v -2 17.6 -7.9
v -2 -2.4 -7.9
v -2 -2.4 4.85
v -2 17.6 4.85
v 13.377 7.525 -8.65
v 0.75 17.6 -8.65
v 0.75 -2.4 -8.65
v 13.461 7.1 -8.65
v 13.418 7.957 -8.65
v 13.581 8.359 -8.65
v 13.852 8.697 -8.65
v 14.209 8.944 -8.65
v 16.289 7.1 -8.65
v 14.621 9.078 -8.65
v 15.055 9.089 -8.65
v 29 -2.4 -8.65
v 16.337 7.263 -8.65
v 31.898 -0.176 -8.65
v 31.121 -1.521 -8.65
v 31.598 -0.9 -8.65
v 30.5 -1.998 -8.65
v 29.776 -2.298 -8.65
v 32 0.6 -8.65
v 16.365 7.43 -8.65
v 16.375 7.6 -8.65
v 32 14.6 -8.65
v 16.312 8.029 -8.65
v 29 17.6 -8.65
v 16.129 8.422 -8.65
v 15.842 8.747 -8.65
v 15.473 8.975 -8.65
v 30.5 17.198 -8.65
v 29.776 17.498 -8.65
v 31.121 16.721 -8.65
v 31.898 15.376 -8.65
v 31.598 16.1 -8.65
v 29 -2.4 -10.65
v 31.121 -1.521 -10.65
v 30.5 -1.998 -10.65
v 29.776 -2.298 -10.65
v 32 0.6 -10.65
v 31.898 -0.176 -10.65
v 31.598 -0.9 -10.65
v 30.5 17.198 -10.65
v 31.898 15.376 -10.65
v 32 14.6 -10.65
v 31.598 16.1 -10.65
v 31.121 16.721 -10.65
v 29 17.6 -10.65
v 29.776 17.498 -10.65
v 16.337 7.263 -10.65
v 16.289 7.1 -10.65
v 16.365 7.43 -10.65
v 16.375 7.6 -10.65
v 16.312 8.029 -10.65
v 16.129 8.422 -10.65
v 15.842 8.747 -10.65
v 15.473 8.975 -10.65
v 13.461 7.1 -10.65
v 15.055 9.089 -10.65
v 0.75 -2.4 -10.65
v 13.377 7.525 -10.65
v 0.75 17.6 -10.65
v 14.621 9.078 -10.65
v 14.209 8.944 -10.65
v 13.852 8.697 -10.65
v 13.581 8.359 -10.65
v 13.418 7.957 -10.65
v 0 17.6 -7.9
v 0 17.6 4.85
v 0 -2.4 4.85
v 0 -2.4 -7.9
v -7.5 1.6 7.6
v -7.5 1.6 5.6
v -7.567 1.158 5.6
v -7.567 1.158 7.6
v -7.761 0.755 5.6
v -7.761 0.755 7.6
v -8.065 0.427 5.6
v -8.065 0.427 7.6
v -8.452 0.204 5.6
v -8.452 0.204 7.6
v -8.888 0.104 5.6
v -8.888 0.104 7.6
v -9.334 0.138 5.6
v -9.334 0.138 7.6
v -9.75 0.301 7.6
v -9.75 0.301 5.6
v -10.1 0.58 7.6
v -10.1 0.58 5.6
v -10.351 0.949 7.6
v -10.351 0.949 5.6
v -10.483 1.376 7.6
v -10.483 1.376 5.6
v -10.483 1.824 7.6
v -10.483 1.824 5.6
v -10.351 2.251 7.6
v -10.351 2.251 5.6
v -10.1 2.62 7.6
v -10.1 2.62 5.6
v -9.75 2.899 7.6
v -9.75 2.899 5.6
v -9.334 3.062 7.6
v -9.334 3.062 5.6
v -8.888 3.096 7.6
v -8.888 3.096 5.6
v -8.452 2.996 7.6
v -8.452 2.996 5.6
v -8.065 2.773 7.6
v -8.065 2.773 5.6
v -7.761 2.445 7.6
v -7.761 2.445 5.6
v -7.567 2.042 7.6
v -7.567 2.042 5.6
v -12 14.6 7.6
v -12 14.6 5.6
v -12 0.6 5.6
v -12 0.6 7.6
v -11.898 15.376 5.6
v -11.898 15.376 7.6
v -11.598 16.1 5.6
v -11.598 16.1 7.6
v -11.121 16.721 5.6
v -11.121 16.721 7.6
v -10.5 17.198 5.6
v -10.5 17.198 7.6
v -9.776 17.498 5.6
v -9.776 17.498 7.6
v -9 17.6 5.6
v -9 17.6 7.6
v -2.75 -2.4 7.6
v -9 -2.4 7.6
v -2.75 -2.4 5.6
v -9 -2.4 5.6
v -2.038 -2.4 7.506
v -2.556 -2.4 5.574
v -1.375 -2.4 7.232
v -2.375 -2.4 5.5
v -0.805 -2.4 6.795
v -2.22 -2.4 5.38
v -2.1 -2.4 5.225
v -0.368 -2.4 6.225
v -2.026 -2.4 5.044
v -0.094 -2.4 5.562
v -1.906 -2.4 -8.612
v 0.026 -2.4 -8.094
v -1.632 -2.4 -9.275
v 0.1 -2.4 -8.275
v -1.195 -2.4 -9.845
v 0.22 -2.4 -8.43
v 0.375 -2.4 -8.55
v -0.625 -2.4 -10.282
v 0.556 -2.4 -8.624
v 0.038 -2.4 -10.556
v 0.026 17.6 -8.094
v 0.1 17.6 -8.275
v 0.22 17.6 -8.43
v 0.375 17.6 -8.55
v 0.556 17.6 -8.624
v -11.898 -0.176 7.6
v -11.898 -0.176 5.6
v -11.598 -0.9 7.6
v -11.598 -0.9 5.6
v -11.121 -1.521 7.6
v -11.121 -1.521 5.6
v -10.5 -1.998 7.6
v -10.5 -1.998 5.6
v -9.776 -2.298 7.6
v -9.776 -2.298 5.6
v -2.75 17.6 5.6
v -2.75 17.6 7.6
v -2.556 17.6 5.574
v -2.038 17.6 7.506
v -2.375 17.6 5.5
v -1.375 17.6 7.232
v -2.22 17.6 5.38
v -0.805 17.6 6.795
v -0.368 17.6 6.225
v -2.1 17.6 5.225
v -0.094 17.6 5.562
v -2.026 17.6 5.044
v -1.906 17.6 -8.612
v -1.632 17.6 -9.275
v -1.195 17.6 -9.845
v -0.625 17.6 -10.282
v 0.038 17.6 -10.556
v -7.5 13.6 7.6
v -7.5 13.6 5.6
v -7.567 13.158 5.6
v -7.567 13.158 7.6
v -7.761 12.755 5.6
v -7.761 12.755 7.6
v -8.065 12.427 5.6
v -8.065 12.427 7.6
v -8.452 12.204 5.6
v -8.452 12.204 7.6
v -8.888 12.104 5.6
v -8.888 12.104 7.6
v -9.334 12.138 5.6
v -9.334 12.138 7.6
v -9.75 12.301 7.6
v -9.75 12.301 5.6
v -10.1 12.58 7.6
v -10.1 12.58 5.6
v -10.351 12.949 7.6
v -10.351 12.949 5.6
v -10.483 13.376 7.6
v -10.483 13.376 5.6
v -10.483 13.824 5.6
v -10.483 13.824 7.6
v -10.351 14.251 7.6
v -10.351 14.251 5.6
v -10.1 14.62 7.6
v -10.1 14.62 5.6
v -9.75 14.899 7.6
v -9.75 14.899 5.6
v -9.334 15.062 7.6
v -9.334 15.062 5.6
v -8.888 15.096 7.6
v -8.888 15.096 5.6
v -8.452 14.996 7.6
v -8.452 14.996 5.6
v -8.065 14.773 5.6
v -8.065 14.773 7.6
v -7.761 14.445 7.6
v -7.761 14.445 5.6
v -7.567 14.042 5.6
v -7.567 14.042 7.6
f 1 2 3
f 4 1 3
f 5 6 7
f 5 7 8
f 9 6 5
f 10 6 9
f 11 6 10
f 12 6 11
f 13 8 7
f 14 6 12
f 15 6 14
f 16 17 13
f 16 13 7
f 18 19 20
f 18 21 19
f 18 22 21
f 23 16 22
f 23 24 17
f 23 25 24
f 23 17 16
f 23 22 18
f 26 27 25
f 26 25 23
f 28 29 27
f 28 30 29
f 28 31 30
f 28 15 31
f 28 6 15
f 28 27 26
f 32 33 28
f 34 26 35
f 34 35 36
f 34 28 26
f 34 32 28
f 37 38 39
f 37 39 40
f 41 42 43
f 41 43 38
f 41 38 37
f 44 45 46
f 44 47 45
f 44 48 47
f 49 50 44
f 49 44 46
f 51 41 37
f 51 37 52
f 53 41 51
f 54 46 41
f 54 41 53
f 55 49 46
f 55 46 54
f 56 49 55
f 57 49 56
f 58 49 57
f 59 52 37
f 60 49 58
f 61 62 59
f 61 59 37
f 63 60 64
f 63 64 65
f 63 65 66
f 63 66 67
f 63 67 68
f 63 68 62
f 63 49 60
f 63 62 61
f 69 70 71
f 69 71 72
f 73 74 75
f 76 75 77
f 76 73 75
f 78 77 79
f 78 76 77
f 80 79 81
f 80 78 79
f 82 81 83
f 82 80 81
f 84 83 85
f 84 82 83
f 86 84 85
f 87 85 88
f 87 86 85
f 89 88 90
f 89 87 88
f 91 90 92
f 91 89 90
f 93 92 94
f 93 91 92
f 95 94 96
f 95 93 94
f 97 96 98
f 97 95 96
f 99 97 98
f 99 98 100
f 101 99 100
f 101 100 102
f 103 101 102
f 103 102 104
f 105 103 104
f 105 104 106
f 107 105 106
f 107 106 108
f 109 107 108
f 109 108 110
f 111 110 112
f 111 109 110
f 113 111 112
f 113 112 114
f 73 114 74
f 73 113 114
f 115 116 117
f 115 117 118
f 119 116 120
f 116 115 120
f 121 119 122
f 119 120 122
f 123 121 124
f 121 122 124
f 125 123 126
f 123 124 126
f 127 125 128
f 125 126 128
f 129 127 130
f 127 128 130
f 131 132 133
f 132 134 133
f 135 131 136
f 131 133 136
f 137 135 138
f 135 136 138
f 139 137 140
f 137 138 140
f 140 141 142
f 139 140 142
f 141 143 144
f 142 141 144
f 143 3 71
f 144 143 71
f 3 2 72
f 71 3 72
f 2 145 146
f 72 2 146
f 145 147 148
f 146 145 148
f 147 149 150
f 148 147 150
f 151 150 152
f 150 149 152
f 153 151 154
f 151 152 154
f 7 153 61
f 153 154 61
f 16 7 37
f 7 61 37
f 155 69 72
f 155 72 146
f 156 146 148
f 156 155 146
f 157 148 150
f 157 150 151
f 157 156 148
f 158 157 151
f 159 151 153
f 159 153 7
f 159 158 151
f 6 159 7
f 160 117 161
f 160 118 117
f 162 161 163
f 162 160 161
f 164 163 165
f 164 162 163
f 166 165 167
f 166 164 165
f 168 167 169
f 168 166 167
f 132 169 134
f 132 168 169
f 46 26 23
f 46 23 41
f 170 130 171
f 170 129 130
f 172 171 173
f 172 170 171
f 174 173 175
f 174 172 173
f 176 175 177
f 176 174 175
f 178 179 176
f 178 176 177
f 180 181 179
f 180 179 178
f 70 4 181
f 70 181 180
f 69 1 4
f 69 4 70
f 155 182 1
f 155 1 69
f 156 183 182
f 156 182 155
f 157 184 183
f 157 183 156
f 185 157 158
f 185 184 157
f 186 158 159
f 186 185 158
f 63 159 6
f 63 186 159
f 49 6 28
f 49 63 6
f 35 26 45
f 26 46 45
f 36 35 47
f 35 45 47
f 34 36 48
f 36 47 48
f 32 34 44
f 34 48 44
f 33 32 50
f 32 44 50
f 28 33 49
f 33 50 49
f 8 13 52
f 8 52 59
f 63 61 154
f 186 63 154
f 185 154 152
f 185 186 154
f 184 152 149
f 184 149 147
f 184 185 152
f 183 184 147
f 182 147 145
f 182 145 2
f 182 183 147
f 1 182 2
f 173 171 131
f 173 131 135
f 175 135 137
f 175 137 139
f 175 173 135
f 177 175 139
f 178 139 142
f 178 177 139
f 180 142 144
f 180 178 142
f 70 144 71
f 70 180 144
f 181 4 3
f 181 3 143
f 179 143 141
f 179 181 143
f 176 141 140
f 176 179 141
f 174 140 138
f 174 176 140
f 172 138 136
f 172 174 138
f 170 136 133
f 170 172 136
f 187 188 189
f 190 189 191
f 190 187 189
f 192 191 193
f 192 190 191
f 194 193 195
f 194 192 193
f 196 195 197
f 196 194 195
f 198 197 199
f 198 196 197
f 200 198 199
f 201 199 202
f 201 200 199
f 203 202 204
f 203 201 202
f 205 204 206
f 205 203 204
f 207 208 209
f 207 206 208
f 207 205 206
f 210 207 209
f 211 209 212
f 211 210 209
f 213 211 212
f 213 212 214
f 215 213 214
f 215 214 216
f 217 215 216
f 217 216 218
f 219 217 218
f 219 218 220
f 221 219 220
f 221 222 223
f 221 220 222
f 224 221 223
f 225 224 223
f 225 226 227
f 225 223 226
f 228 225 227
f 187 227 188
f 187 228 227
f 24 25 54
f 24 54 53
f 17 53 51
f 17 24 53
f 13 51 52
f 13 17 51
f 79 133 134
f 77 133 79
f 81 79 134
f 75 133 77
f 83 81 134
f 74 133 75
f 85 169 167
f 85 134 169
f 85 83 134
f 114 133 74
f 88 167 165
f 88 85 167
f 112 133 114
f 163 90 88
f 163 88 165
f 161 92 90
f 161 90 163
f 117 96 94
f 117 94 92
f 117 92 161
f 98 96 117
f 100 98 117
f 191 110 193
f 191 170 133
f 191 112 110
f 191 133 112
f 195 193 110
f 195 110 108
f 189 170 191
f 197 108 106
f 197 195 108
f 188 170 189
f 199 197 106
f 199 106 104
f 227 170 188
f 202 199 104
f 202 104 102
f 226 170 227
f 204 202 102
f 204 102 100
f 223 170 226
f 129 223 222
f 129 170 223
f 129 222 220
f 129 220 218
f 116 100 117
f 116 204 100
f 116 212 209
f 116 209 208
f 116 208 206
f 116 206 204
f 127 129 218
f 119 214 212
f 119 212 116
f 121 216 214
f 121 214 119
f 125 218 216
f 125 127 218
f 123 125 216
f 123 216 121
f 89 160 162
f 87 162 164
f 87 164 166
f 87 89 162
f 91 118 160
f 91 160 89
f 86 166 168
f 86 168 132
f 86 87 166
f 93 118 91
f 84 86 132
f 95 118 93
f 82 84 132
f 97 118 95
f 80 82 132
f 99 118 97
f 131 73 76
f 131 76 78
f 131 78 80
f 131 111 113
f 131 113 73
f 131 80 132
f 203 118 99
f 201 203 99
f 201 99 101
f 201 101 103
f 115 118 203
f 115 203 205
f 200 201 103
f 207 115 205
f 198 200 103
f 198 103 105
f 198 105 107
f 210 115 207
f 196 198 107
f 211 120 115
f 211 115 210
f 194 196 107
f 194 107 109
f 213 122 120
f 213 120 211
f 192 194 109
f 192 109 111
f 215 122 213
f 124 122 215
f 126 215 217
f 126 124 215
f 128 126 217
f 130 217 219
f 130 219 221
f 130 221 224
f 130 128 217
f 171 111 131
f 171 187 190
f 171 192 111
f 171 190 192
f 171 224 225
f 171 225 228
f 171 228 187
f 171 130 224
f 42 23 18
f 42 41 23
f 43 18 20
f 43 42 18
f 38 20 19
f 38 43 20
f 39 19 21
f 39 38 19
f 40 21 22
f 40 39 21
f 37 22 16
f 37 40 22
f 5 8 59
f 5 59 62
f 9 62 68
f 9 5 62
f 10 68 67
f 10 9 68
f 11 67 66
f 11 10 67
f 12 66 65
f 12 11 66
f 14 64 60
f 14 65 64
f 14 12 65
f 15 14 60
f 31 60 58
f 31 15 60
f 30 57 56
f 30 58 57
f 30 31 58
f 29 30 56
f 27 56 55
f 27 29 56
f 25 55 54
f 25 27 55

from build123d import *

# Parameters (mm, degrees)
BASE_FLANGE1_DEPTH    = 10
FILLET1_R             = 3
SKETCH7_R             = 1.5
CUT_EXTRUDE1_DEPTH    = 39.171488051
BODY_MOVE_COPY1_ANGLE = 90


# Sheet-metal steps are written as plain solids
with BuildPart() as part:
    # Sketch1 → Base-Flange1 (new, symmetric)
    with BuildSketch(Plane.XY):
        with BuildLine():
            Line((-12, 0), (-2.75, 0))
            ThreePointArc((-2.75, 0), (-0.805456352, 0.805456352), (0, 2.75))
            Line((0, 2.75), (0, 15.5))
            ThreePointArc((0, 15.5), (0.219669914, 16.030330086), (0.75, 16.25))
            Line((0.75, 16.25), (32, 16.25))
            Line((32, 16.25), (32, 18.25))
            Line((32, 18.25), (0.75, 18.25))
            ThreePointArc((0.75, 18.25), (-1.194543648, 17.444543648), (-2, 15.5))
            Line((-2, 15.5), (-2, 2.75))
            ThreePointArc((-2, 2.75), (-2.219669914, 2.219669914), (-2.75, 2))
            Line((-2.75, 2), (-12, 2))
            Line((-12, 2), (-12, 0))
        make_face()
    extrude(amount=BASE_FLANGE1_DEPTH, both=True)

    # Fillet1
    fillet1_edges = [part.edges().sort_by_distance(p)[0] for p in [
        (32, 17.25, -10),
        (-12, 1, -10),
        (32, 17.25, 10),
        (-12, 1, 10),
    ]]
    fillet(fillet1_edges, radius=FILLET1_R)

    # Sketch7 → Cut-Extrude1 (cut, through all)
    with BuildSketch(Plane(origin=(0, 0, 0), x_dir=(1, 0, 0), z_dir=(0, 1, 0))):
        with BuildLine():
            Line((16.289213562, 0.5), (13.460786438, 0.5))
            ThreePointArc((13.460786438, 0.5), (14.621347032, -1.478397839), (16.375, 0))
            ThreePointArc((16.375, 0), (16.353397839, 0.253652968), (16.289213562, 0.5))
        make_face()
        with Locations((-9, -6)):
            Circle(SKETCH7_R)
        with Locations((-9, 6)):
            Circle(SKETCH7_R)
    extrude(amount=CUT_EXTRUDE1_DEPTH, mode=Mode.SUBTRACT)


with BuildPart() as part_1:
    # Body-Move/Copy1: moved
    add(part.part.rotate(Axis((0, 7.6, 0), (-1, 0, 0)), BODY_MOVE_COPY1_ANGLE))


solid = part_1.part
